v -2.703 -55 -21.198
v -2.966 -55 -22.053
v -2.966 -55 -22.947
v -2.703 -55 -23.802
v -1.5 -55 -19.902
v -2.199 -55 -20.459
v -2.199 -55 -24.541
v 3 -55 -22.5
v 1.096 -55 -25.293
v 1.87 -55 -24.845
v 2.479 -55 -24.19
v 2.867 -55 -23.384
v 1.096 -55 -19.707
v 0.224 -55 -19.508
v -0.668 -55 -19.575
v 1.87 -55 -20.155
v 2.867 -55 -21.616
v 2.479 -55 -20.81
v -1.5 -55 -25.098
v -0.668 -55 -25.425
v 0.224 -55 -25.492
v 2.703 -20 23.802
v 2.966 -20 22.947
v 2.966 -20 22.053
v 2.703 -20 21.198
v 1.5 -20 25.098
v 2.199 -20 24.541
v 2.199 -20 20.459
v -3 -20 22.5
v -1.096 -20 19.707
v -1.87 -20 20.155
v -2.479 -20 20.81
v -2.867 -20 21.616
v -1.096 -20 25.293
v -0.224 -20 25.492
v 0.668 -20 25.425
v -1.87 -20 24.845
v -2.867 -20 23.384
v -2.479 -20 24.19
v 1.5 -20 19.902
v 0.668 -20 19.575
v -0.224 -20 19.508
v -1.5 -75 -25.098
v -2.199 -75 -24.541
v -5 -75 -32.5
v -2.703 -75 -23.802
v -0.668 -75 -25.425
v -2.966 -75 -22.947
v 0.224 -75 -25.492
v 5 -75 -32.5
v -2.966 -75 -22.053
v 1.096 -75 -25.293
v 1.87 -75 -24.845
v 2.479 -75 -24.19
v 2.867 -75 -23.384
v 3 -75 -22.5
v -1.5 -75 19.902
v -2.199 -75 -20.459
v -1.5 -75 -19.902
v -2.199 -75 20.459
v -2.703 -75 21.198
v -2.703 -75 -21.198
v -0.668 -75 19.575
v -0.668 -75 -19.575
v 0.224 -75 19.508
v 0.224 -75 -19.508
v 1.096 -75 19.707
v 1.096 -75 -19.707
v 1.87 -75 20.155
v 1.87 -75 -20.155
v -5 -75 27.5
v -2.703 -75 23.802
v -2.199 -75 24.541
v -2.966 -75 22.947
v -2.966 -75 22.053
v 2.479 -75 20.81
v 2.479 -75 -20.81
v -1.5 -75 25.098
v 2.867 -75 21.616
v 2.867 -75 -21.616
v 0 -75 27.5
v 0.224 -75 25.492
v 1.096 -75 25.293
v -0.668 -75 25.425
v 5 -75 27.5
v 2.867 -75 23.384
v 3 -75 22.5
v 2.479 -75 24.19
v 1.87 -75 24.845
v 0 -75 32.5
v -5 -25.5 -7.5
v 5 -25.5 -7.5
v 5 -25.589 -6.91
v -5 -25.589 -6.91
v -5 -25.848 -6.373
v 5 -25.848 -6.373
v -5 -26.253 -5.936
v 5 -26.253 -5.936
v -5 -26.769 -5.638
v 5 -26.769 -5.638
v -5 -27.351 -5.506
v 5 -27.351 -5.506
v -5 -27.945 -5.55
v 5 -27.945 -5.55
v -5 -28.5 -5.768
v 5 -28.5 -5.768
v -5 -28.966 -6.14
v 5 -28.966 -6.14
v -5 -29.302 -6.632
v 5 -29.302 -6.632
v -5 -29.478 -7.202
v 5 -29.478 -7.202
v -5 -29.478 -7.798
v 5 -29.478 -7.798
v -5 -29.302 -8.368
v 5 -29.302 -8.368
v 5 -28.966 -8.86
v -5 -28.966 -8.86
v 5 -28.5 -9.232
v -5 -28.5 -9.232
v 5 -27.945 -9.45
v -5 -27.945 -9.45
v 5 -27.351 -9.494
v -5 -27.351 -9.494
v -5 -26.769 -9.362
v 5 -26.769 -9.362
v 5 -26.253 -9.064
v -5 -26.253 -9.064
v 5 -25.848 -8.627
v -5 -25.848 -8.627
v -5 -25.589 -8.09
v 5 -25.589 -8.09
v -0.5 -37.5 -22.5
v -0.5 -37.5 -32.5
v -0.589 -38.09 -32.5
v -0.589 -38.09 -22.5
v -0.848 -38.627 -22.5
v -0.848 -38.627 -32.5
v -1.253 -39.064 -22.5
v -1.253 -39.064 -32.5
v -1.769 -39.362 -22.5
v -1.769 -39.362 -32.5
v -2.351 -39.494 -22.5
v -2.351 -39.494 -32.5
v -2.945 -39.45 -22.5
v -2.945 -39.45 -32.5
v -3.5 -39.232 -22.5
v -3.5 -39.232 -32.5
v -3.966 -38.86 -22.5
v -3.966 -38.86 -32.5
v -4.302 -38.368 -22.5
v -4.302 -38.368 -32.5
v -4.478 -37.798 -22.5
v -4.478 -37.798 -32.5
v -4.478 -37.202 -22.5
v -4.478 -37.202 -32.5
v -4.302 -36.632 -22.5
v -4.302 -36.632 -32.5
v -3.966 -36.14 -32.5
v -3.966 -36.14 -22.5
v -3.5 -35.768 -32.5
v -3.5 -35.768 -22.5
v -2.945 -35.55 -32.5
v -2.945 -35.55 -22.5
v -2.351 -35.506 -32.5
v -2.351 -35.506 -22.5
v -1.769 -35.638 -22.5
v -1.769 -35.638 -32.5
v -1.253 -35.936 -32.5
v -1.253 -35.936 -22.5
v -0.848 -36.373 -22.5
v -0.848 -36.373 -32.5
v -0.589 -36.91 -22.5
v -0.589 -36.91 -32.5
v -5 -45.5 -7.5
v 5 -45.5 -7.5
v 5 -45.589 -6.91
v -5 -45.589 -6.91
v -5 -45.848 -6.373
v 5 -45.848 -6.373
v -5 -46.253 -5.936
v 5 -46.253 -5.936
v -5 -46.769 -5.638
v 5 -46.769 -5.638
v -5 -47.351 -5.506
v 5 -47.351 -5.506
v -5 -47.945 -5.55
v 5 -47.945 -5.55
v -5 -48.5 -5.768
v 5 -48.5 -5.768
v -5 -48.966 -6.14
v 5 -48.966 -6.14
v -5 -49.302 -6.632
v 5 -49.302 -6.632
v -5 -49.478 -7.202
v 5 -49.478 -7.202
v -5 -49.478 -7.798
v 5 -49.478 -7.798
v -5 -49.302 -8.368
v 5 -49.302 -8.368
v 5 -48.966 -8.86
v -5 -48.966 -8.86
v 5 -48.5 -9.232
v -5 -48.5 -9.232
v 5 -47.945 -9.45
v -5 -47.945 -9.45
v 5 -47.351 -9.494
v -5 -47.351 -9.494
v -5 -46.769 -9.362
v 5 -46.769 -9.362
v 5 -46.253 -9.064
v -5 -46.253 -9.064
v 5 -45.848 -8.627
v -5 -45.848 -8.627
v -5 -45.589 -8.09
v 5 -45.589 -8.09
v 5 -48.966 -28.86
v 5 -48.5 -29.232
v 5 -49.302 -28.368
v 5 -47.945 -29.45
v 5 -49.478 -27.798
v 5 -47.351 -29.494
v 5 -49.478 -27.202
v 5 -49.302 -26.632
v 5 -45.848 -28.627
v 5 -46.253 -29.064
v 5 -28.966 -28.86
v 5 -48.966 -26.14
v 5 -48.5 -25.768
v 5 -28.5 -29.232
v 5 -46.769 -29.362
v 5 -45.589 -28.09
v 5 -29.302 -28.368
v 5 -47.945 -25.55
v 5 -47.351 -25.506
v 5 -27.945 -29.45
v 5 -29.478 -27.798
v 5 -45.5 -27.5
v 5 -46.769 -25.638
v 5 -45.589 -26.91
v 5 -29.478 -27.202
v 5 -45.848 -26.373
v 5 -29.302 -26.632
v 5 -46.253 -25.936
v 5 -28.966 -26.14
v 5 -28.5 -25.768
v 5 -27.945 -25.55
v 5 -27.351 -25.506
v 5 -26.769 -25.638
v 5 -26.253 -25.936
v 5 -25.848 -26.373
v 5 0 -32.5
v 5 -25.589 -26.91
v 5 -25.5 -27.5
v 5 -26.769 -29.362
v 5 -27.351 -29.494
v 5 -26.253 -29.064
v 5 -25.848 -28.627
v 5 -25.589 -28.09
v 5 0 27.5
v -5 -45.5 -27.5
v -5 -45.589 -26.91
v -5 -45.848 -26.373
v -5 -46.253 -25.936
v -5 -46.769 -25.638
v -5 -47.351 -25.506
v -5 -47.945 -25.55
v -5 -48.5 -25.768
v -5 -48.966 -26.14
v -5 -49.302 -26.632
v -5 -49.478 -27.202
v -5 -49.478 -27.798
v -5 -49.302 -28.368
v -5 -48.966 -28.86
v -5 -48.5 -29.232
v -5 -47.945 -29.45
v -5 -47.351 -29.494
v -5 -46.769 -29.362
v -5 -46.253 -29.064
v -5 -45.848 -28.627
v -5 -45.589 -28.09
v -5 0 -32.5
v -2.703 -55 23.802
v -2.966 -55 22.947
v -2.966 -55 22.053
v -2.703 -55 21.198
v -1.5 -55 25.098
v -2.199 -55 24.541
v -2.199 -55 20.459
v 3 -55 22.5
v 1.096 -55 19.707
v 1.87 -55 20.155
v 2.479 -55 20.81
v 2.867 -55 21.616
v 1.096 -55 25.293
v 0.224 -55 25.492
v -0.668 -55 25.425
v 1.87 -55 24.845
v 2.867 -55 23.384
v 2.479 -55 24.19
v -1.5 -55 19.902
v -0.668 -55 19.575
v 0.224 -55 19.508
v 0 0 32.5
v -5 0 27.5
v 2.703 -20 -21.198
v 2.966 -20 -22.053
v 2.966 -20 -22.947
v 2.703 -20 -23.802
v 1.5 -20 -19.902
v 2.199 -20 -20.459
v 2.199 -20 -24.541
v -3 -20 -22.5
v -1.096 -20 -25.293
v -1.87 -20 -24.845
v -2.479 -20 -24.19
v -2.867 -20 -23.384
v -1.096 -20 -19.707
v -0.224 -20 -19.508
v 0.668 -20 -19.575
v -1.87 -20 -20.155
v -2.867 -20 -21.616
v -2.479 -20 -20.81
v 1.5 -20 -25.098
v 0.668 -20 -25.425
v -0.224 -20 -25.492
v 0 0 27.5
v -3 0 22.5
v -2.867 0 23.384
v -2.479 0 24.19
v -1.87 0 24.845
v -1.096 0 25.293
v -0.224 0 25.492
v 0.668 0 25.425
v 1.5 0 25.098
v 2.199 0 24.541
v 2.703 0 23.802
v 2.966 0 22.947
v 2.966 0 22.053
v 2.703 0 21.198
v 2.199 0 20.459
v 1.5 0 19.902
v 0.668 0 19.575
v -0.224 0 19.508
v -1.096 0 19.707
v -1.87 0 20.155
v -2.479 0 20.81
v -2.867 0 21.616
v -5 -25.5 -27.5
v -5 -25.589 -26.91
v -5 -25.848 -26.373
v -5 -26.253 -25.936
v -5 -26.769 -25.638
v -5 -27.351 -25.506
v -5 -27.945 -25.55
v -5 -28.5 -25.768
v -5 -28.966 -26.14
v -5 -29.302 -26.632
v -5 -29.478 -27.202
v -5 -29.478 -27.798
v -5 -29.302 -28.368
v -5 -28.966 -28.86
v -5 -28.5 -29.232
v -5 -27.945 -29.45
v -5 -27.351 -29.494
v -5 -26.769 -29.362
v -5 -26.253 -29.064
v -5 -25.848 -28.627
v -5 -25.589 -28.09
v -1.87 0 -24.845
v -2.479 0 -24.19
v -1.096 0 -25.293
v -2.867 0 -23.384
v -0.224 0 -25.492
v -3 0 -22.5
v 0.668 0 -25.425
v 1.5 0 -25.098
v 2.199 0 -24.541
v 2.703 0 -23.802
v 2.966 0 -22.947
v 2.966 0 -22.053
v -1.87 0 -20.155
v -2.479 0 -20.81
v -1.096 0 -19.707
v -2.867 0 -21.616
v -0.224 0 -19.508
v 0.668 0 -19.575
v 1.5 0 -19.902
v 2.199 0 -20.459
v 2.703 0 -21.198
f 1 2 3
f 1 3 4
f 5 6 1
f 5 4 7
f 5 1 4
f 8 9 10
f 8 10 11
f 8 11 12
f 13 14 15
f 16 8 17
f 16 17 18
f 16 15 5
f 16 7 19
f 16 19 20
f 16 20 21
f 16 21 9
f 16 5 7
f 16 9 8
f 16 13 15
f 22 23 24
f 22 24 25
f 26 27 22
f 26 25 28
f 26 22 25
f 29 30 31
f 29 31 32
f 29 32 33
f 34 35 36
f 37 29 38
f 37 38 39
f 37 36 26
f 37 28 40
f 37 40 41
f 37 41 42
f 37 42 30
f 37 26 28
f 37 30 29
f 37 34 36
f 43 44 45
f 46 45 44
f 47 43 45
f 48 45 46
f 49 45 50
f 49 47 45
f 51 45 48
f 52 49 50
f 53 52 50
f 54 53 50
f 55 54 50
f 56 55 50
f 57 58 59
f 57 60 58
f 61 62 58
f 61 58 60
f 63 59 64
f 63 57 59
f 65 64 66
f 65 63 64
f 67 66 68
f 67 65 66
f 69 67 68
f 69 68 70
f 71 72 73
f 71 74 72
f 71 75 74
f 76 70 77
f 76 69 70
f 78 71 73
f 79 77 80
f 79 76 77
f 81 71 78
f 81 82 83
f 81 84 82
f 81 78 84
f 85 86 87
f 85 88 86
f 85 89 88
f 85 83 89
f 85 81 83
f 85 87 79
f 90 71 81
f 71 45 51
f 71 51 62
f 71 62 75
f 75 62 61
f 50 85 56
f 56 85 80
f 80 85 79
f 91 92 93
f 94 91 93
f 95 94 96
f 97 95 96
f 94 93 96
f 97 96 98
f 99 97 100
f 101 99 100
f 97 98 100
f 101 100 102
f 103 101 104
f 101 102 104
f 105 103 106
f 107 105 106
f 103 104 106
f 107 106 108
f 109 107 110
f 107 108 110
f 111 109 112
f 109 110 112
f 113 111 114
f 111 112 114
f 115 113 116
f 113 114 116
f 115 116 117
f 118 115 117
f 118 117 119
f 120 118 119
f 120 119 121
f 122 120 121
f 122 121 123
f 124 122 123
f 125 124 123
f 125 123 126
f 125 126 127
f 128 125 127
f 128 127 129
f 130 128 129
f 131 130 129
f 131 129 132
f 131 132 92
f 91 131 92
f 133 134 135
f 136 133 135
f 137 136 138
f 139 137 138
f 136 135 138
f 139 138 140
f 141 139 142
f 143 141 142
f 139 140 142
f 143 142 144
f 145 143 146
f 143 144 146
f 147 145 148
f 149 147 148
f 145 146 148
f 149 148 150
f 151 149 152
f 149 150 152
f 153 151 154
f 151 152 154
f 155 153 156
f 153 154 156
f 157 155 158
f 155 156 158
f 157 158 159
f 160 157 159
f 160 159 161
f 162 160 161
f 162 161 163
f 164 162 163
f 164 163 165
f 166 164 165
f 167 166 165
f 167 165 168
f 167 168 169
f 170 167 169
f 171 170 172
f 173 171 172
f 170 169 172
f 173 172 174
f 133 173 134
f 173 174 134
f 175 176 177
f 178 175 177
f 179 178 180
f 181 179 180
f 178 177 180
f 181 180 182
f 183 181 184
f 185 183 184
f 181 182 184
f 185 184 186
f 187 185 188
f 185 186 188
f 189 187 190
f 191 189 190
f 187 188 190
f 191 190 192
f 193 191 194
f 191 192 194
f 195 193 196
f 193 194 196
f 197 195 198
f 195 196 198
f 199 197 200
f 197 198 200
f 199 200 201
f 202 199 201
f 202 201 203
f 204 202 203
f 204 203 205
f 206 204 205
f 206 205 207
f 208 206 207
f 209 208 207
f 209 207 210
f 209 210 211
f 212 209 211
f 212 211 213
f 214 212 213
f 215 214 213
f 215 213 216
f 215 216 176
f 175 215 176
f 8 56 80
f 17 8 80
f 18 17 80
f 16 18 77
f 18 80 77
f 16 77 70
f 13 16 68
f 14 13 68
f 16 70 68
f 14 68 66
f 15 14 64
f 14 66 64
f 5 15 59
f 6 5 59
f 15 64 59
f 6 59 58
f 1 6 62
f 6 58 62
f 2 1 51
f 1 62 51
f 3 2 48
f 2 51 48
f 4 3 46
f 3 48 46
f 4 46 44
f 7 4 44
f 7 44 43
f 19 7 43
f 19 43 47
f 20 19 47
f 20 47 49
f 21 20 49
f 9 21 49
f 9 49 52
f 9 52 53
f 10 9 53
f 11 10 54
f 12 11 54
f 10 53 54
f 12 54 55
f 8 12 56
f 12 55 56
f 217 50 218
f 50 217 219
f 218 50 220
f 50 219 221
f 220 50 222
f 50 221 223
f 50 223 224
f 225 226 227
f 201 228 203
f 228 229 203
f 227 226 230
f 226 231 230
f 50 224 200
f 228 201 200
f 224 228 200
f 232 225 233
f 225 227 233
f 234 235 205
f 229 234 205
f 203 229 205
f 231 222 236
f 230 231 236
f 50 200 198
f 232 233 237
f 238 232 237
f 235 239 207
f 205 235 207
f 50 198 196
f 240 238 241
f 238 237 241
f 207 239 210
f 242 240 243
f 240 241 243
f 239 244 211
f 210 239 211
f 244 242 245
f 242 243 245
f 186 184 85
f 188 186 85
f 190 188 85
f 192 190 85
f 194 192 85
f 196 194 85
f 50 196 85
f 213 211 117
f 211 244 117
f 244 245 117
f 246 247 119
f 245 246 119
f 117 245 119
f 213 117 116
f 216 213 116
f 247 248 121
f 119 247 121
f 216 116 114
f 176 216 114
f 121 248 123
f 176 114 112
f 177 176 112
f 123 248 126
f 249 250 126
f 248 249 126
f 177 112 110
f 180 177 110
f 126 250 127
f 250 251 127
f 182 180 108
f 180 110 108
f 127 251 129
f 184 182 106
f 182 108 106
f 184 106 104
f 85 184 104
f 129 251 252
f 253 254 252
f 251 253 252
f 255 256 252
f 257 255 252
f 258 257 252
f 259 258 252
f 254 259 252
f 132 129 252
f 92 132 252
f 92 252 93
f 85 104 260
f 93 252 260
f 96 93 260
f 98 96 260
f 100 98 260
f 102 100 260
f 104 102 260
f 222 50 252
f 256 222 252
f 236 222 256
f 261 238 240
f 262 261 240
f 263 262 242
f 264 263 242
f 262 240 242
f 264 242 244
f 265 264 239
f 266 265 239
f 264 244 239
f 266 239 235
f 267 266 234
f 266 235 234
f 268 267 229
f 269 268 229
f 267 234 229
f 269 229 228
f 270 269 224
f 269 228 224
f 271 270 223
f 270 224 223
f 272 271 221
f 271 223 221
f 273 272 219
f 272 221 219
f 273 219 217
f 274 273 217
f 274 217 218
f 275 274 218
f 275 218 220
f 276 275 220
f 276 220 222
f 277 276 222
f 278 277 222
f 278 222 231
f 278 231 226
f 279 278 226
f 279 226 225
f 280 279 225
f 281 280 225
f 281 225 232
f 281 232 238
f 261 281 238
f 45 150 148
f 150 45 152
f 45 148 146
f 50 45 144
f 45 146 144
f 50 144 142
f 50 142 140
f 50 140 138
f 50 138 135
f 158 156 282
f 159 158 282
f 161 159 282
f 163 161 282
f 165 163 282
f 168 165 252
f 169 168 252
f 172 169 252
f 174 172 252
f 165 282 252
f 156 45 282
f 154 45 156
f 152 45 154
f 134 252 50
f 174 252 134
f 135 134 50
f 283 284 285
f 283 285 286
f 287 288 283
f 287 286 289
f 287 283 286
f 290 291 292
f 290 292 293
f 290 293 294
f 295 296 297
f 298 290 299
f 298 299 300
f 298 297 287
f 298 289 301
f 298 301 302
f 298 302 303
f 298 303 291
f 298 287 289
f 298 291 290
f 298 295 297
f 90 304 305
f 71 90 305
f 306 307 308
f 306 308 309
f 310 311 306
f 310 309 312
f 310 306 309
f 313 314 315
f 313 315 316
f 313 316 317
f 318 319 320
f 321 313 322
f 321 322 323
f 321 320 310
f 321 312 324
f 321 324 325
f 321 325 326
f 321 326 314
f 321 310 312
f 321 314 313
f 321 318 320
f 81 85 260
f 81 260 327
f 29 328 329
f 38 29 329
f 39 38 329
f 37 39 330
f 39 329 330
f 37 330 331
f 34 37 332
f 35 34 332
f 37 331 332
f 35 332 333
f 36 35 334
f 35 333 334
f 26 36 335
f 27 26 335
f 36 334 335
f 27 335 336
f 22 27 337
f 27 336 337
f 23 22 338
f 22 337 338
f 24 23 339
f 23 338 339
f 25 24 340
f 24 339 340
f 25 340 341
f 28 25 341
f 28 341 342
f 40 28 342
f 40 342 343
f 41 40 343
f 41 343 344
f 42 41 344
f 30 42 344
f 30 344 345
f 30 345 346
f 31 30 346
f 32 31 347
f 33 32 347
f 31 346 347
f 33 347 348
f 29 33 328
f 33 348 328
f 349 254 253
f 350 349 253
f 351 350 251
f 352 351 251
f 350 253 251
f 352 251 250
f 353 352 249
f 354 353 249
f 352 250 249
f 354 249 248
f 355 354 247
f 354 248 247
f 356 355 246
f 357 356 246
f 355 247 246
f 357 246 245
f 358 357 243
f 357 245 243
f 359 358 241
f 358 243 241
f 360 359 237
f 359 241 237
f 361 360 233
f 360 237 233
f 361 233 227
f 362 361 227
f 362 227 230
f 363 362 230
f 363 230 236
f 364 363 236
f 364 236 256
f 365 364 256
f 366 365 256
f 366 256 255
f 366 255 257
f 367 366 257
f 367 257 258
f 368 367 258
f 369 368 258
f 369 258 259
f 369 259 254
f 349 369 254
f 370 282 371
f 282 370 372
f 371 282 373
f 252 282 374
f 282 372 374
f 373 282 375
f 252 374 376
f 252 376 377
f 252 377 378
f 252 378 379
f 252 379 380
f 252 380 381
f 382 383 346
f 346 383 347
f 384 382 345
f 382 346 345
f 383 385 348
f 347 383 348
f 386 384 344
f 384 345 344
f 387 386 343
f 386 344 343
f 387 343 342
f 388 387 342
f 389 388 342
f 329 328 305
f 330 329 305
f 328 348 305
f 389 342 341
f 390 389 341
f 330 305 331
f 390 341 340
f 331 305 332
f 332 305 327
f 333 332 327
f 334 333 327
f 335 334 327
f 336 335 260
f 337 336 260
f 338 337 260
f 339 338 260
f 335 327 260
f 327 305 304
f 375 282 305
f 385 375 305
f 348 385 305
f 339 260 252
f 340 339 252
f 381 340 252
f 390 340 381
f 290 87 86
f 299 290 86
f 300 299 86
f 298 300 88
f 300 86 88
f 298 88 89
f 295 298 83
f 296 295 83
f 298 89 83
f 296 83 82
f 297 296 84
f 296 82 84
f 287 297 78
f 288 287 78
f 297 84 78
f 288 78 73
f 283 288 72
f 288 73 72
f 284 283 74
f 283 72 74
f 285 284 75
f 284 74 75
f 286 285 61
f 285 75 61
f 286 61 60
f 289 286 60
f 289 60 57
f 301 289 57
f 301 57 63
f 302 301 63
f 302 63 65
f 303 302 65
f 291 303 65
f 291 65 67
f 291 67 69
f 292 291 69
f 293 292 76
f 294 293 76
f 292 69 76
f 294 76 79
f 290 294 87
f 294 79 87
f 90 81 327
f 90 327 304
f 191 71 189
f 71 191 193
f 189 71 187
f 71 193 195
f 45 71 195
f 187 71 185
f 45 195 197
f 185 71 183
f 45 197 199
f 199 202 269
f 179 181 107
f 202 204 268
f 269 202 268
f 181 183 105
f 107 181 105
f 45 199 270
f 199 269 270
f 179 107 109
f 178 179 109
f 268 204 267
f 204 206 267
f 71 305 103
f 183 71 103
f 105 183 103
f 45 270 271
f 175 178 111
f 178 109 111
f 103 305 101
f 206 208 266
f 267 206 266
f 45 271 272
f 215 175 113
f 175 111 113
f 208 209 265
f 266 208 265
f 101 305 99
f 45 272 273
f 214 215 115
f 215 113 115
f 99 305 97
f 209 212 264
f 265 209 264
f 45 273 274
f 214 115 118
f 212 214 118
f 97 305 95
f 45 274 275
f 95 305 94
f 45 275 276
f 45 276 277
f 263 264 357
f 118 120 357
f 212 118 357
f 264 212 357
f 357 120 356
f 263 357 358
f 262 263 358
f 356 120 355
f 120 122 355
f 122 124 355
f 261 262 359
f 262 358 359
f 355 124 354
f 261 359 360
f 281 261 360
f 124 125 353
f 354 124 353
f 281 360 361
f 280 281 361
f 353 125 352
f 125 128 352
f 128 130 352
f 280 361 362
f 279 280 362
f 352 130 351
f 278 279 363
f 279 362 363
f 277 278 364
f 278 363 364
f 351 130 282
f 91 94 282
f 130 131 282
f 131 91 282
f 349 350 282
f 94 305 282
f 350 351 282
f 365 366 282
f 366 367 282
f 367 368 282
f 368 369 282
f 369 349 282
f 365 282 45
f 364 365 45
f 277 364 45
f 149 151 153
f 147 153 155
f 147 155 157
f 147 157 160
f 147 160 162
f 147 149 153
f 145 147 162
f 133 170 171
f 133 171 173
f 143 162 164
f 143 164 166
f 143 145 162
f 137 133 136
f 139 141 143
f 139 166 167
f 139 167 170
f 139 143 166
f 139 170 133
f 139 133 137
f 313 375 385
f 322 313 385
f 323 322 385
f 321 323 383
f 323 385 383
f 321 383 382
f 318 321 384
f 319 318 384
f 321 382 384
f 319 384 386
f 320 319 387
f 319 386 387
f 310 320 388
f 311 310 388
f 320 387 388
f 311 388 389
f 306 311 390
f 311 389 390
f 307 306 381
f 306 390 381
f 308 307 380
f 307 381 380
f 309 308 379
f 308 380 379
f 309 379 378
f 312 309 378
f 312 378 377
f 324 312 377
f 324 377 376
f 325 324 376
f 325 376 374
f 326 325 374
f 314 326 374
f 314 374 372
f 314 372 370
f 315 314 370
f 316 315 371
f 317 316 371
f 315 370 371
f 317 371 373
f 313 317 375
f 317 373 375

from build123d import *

# Parameters (mm, degrees)
F1_DEPTH  = 75
F3_R      = 2
F4_DEPTH  = 25
F6_R      = 3
F7_DEPTH  = 20
F8_R      = 3
F9_DEPTH  = 20
F10_R     = 3
F11_DEPTH = 20
F12_R     = 3
F13_DEPTH = 20
F2_R      = 2
F14_DEPTH = 10
F15_DEPTH = 25


with BuildPart() as f1:
    # F0 (on Front) → F1 (new body)
    with BuildSketch(Plane.XZ):
        Polygon((-5, 27.5), (-5, -32.5), (5, -32.5), (5, 27.5), (0, 27.5), (0, 32.5), align=None)
    extrude(amount=F1_DEPTH)

    # F3 (on face) → F4 (cut)
    with BuildSketch(Plane.YZ.offset(5)):
        with Locations((-47.5, -27.5)):
            Circle(F3_R)
        with Locations((-47.5, -7.5)):
            Circle(F3_R)
        with Locations((-27.5, -7.5)):
            Circle(F3_R)
        with Locations((-27.5, -27.5)):
            Circle(F3_R)
    extrude(amount=-F4_DEPTH, mode=Mode.SUBTRACT)

    # F6 (on face) → F7 (cut)
    with BuildSketch(Plane(origin=(0, 0, 0), x_dir=(-1, 0, 0), z_dir=(0, 1, 0))):
        with Locations((0, -22.5)):
            Circle(F6_R)
    extrude(amount=-F7_DEPTH, mode=Mode.SUBTRACT)

    # F8 (on face) → F9 (cut)
    with BuildSketch(Plane.XZ.offset(75)):
        with Locations((0, 22.5)):
            Circle(F8_R)
    extrude(amount=-F9_DEPTH, mode=Mode.SUBTRACT)

    # F10 (on face) → F11 (cut)
    with BuildSketch(Plane.XZ.offset(75)):
        with Locations((0, -22.5)):
            Circle(F10_R)
    extrude(amount=-F11_DEPTH, mode=Mode.SUBTRACT)

    # F12 (on face) → F13 (cut)
    with BuildSketch(Plane(origin=(0, 0, 0), x_dir=(-1, 0, 0), z_dir=(0, 1, 0))):
        with Locations((0, 22.5)):
            Circle(F12_R)
    extrude(amount=-F13_DEPTH, mode=Mode.SUBTRACT)

    # F2 (on face) → F14 (cut)
    with BuildSketch(Plane(origin=(0, 0, -32.5), x_dir=(1, 0, 0), z_dir=(0, 0, -1))):
        with Locations((-2.5, 37.5)):
            Circle(F2_R)
    extrude(amount=-F14_DEPTH, mode=Mode.SUBTRACT)

    # F3 (on face) → F15 (cut)
    with BuildSketch(Plane.YZ.offset(5)):
        with Locations((-47.5, -27.5)):
            Circle(F3_R)
        with Locations((-47.5, -7.5)):
            Circle(F3_R)
        with Locations((-27.5, -7.5)):
            Circle(F3_R)
        with Locations((-27.5, -27.5)):
            Circle(F3_R)
    extrude(amount=-F15_DEPTH, mode=Mode.SUBTRACT)


solid = f1.part
